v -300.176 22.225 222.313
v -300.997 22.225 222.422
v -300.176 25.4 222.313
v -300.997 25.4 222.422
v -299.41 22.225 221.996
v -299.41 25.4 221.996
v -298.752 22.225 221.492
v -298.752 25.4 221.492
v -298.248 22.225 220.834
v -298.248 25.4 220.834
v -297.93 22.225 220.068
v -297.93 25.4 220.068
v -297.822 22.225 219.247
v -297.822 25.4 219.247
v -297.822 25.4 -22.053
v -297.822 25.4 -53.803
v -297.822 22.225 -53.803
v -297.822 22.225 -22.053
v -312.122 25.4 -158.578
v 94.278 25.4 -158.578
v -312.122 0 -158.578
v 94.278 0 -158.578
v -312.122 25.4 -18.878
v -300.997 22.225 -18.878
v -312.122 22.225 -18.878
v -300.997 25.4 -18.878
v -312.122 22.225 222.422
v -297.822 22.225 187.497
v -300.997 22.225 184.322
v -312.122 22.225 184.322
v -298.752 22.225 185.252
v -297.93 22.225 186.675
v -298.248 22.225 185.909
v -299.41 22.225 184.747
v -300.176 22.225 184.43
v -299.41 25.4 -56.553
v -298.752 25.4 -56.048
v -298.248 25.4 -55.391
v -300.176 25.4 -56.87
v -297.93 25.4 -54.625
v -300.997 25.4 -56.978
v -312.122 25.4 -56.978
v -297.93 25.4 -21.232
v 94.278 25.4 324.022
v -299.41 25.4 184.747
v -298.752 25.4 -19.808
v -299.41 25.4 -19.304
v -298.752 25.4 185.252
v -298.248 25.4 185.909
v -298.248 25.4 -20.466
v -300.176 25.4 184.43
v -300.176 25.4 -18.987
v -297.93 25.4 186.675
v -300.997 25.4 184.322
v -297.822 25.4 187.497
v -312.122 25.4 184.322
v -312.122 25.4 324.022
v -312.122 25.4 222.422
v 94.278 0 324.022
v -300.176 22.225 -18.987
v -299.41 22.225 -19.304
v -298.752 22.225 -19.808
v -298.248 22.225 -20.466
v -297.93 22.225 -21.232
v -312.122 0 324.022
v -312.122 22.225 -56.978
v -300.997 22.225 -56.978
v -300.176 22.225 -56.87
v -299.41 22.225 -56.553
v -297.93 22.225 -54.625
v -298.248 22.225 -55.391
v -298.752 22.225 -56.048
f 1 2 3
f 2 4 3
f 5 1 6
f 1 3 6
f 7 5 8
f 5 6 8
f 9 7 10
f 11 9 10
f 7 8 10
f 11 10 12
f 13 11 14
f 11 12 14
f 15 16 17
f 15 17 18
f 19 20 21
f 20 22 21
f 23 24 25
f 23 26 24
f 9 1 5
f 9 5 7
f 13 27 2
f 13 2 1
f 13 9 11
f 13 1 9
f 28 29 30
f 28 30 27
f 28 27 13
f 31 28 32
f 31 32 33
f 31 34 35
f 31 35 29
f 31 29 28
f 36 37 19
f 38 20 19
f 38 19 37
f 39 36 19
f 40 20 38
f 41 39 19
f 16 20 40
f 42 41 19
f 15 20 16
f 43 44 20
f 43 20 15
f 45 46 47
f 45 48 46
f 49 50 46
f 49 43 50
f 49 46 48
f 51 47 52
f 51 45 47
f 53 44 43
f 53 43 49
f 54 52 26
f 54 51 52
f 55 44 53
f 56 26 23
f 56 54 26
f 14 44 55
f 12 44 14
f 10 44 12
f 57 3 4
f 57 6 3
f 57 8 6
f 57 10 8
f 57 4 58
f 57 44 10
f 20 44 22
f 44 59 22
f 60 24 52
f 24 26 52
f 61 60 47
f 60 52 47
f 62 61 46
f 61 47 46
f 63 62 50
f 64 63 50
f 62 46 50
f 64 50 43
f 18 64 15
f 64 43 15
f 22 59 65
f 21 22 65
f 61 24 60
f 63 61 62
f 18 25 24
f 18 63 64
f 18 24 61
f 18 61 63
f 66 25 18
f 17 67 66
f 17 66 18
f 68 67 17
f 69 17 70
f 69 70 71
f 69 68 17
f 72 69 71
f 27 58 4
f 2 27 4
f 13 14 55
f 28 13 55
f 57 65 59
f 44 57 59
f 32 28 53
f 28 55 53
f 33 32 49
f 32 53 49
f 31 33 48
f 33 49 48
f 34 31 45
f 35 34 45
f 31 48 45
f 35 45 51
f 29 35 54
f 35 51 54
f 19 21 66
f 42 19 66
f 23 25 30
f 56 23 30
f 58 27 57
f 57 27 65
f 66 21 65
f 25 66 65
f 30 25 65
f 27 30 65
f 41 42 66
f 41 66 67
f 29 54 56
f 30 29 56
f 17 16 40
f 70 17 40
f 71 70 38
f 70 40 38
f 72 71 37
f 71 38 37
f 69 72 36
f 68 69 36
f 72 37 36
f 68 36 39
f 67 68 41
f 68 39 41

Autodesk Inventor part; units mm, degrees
ref_plane "YZ Plane" through (0, 0, 0) normal (1, 0, 0) x (0, 1, 0)
ref_plane "XZ Plane" through (0, 0, 0) normal (0, 1, 0) x (-1, 0, 0)
ref_plane "XY Plane" through (0, 0, 0) normal (0, 0, 1) x (1, 0, 0)
sketch "Sketch1" plane through (0, 0, 0) normal (0, 1, 0) x (-1, 0, 0)
  line L0 (312.1225, 324.0216) -> (-94.2775, 324.0216)
  line L1 (-94.2775, 324.0216) -> (-94.2775, -158.5784)
  line L2 (-94.2775, -158.5784) -> (312.1225, -158.5784)
  line L3 (312.1225, -158.5784) -> (312.1225, 324.0216)
  point P0 (0, 0)
  dimension "d0" = 406.4
  dimension "d1" = 482.6
extrude "Board" add sketch "Sketch1" along normal blind 25.4
sketch "Hinge Cuts" plane through (0, 25.4, 0) normal (0, 1, 0) x (1, 0, 0)
  line L0 (-312.1225, 158.5784) -> (-312.1225, -324.0216) projected
  line L1 (-312.1225, 56.9784) -> (-300.9973, 56.9784)
  line L2 (-297.8223, 53.8034) -> (-297.8223, 22.0534)
  line L3 (-300.9973, 18.8784) -> (-312.1225, 18.8784)
  line L4 (-312.1225, 18.8784) -> (-312.1225, 56.9784)
  line L5 (94.2775, 158.5784) -> (-312.1225, 158.5784) projected
  line L6 (-312.1225, -222.4216) -> (-300.9973, -222.4216)
  line L7 (-297.8223, -219.2466) -> (-297.8223, -187.4966)
  line L8 (-300.9973, -184.3216) -> (-312.1225, -184.3216)
  line L9 (-312.1225, -184.3216) -> (-312.1225, -222.4216)
  arc A0 (-297.8223, -187.4966) -> (-300.9973, -184.3216) centre (-300.9973, -187.4966) ccw
  arc A1 (-300.9973, -222.4216) -> (-297.8223, -219.2466) centre (-300.9973, -219.2466) ccw
  arc A2 (-300.9973, 18.8784) -> (-297.8223, 22.0534) centre (-300.9973, 22.0534) ccw
  arc A3 (-297.8223, 53.8034) -> (-300.9973, 56.9784) centre (-300.9973, 53.8034) ccw
  point P0 (0, 0)
  point P1 (-297.8223, 18.8784)
  point P2 (-297.8223, 56.9784)
  point P3 (-297.8223, -184.3216)
  point P4 (-297.8223, -222.4216)
  dimension "d4" = 38.1
  dimension "d5" = 14.3002
  dimension "d6" = 101.6
  dimension "d7" = 38.1
  dimension "d8" = 14.3002
  dimension "d9" = 203.2
  dimension "d10" = 3.175
extrude "Extrusion2" cut sketch "Hinge Cuts" against normal blind 3.175
equation "\"d6\" = 0.25 * d1 - 0.5 * d4"
equation "\"d7\" = d4"
equation "\"d8\" = d5"
equation "\"d9\" = 2 * d6"
properties part number "Extension Shelves" material "Wood (Oak)"
